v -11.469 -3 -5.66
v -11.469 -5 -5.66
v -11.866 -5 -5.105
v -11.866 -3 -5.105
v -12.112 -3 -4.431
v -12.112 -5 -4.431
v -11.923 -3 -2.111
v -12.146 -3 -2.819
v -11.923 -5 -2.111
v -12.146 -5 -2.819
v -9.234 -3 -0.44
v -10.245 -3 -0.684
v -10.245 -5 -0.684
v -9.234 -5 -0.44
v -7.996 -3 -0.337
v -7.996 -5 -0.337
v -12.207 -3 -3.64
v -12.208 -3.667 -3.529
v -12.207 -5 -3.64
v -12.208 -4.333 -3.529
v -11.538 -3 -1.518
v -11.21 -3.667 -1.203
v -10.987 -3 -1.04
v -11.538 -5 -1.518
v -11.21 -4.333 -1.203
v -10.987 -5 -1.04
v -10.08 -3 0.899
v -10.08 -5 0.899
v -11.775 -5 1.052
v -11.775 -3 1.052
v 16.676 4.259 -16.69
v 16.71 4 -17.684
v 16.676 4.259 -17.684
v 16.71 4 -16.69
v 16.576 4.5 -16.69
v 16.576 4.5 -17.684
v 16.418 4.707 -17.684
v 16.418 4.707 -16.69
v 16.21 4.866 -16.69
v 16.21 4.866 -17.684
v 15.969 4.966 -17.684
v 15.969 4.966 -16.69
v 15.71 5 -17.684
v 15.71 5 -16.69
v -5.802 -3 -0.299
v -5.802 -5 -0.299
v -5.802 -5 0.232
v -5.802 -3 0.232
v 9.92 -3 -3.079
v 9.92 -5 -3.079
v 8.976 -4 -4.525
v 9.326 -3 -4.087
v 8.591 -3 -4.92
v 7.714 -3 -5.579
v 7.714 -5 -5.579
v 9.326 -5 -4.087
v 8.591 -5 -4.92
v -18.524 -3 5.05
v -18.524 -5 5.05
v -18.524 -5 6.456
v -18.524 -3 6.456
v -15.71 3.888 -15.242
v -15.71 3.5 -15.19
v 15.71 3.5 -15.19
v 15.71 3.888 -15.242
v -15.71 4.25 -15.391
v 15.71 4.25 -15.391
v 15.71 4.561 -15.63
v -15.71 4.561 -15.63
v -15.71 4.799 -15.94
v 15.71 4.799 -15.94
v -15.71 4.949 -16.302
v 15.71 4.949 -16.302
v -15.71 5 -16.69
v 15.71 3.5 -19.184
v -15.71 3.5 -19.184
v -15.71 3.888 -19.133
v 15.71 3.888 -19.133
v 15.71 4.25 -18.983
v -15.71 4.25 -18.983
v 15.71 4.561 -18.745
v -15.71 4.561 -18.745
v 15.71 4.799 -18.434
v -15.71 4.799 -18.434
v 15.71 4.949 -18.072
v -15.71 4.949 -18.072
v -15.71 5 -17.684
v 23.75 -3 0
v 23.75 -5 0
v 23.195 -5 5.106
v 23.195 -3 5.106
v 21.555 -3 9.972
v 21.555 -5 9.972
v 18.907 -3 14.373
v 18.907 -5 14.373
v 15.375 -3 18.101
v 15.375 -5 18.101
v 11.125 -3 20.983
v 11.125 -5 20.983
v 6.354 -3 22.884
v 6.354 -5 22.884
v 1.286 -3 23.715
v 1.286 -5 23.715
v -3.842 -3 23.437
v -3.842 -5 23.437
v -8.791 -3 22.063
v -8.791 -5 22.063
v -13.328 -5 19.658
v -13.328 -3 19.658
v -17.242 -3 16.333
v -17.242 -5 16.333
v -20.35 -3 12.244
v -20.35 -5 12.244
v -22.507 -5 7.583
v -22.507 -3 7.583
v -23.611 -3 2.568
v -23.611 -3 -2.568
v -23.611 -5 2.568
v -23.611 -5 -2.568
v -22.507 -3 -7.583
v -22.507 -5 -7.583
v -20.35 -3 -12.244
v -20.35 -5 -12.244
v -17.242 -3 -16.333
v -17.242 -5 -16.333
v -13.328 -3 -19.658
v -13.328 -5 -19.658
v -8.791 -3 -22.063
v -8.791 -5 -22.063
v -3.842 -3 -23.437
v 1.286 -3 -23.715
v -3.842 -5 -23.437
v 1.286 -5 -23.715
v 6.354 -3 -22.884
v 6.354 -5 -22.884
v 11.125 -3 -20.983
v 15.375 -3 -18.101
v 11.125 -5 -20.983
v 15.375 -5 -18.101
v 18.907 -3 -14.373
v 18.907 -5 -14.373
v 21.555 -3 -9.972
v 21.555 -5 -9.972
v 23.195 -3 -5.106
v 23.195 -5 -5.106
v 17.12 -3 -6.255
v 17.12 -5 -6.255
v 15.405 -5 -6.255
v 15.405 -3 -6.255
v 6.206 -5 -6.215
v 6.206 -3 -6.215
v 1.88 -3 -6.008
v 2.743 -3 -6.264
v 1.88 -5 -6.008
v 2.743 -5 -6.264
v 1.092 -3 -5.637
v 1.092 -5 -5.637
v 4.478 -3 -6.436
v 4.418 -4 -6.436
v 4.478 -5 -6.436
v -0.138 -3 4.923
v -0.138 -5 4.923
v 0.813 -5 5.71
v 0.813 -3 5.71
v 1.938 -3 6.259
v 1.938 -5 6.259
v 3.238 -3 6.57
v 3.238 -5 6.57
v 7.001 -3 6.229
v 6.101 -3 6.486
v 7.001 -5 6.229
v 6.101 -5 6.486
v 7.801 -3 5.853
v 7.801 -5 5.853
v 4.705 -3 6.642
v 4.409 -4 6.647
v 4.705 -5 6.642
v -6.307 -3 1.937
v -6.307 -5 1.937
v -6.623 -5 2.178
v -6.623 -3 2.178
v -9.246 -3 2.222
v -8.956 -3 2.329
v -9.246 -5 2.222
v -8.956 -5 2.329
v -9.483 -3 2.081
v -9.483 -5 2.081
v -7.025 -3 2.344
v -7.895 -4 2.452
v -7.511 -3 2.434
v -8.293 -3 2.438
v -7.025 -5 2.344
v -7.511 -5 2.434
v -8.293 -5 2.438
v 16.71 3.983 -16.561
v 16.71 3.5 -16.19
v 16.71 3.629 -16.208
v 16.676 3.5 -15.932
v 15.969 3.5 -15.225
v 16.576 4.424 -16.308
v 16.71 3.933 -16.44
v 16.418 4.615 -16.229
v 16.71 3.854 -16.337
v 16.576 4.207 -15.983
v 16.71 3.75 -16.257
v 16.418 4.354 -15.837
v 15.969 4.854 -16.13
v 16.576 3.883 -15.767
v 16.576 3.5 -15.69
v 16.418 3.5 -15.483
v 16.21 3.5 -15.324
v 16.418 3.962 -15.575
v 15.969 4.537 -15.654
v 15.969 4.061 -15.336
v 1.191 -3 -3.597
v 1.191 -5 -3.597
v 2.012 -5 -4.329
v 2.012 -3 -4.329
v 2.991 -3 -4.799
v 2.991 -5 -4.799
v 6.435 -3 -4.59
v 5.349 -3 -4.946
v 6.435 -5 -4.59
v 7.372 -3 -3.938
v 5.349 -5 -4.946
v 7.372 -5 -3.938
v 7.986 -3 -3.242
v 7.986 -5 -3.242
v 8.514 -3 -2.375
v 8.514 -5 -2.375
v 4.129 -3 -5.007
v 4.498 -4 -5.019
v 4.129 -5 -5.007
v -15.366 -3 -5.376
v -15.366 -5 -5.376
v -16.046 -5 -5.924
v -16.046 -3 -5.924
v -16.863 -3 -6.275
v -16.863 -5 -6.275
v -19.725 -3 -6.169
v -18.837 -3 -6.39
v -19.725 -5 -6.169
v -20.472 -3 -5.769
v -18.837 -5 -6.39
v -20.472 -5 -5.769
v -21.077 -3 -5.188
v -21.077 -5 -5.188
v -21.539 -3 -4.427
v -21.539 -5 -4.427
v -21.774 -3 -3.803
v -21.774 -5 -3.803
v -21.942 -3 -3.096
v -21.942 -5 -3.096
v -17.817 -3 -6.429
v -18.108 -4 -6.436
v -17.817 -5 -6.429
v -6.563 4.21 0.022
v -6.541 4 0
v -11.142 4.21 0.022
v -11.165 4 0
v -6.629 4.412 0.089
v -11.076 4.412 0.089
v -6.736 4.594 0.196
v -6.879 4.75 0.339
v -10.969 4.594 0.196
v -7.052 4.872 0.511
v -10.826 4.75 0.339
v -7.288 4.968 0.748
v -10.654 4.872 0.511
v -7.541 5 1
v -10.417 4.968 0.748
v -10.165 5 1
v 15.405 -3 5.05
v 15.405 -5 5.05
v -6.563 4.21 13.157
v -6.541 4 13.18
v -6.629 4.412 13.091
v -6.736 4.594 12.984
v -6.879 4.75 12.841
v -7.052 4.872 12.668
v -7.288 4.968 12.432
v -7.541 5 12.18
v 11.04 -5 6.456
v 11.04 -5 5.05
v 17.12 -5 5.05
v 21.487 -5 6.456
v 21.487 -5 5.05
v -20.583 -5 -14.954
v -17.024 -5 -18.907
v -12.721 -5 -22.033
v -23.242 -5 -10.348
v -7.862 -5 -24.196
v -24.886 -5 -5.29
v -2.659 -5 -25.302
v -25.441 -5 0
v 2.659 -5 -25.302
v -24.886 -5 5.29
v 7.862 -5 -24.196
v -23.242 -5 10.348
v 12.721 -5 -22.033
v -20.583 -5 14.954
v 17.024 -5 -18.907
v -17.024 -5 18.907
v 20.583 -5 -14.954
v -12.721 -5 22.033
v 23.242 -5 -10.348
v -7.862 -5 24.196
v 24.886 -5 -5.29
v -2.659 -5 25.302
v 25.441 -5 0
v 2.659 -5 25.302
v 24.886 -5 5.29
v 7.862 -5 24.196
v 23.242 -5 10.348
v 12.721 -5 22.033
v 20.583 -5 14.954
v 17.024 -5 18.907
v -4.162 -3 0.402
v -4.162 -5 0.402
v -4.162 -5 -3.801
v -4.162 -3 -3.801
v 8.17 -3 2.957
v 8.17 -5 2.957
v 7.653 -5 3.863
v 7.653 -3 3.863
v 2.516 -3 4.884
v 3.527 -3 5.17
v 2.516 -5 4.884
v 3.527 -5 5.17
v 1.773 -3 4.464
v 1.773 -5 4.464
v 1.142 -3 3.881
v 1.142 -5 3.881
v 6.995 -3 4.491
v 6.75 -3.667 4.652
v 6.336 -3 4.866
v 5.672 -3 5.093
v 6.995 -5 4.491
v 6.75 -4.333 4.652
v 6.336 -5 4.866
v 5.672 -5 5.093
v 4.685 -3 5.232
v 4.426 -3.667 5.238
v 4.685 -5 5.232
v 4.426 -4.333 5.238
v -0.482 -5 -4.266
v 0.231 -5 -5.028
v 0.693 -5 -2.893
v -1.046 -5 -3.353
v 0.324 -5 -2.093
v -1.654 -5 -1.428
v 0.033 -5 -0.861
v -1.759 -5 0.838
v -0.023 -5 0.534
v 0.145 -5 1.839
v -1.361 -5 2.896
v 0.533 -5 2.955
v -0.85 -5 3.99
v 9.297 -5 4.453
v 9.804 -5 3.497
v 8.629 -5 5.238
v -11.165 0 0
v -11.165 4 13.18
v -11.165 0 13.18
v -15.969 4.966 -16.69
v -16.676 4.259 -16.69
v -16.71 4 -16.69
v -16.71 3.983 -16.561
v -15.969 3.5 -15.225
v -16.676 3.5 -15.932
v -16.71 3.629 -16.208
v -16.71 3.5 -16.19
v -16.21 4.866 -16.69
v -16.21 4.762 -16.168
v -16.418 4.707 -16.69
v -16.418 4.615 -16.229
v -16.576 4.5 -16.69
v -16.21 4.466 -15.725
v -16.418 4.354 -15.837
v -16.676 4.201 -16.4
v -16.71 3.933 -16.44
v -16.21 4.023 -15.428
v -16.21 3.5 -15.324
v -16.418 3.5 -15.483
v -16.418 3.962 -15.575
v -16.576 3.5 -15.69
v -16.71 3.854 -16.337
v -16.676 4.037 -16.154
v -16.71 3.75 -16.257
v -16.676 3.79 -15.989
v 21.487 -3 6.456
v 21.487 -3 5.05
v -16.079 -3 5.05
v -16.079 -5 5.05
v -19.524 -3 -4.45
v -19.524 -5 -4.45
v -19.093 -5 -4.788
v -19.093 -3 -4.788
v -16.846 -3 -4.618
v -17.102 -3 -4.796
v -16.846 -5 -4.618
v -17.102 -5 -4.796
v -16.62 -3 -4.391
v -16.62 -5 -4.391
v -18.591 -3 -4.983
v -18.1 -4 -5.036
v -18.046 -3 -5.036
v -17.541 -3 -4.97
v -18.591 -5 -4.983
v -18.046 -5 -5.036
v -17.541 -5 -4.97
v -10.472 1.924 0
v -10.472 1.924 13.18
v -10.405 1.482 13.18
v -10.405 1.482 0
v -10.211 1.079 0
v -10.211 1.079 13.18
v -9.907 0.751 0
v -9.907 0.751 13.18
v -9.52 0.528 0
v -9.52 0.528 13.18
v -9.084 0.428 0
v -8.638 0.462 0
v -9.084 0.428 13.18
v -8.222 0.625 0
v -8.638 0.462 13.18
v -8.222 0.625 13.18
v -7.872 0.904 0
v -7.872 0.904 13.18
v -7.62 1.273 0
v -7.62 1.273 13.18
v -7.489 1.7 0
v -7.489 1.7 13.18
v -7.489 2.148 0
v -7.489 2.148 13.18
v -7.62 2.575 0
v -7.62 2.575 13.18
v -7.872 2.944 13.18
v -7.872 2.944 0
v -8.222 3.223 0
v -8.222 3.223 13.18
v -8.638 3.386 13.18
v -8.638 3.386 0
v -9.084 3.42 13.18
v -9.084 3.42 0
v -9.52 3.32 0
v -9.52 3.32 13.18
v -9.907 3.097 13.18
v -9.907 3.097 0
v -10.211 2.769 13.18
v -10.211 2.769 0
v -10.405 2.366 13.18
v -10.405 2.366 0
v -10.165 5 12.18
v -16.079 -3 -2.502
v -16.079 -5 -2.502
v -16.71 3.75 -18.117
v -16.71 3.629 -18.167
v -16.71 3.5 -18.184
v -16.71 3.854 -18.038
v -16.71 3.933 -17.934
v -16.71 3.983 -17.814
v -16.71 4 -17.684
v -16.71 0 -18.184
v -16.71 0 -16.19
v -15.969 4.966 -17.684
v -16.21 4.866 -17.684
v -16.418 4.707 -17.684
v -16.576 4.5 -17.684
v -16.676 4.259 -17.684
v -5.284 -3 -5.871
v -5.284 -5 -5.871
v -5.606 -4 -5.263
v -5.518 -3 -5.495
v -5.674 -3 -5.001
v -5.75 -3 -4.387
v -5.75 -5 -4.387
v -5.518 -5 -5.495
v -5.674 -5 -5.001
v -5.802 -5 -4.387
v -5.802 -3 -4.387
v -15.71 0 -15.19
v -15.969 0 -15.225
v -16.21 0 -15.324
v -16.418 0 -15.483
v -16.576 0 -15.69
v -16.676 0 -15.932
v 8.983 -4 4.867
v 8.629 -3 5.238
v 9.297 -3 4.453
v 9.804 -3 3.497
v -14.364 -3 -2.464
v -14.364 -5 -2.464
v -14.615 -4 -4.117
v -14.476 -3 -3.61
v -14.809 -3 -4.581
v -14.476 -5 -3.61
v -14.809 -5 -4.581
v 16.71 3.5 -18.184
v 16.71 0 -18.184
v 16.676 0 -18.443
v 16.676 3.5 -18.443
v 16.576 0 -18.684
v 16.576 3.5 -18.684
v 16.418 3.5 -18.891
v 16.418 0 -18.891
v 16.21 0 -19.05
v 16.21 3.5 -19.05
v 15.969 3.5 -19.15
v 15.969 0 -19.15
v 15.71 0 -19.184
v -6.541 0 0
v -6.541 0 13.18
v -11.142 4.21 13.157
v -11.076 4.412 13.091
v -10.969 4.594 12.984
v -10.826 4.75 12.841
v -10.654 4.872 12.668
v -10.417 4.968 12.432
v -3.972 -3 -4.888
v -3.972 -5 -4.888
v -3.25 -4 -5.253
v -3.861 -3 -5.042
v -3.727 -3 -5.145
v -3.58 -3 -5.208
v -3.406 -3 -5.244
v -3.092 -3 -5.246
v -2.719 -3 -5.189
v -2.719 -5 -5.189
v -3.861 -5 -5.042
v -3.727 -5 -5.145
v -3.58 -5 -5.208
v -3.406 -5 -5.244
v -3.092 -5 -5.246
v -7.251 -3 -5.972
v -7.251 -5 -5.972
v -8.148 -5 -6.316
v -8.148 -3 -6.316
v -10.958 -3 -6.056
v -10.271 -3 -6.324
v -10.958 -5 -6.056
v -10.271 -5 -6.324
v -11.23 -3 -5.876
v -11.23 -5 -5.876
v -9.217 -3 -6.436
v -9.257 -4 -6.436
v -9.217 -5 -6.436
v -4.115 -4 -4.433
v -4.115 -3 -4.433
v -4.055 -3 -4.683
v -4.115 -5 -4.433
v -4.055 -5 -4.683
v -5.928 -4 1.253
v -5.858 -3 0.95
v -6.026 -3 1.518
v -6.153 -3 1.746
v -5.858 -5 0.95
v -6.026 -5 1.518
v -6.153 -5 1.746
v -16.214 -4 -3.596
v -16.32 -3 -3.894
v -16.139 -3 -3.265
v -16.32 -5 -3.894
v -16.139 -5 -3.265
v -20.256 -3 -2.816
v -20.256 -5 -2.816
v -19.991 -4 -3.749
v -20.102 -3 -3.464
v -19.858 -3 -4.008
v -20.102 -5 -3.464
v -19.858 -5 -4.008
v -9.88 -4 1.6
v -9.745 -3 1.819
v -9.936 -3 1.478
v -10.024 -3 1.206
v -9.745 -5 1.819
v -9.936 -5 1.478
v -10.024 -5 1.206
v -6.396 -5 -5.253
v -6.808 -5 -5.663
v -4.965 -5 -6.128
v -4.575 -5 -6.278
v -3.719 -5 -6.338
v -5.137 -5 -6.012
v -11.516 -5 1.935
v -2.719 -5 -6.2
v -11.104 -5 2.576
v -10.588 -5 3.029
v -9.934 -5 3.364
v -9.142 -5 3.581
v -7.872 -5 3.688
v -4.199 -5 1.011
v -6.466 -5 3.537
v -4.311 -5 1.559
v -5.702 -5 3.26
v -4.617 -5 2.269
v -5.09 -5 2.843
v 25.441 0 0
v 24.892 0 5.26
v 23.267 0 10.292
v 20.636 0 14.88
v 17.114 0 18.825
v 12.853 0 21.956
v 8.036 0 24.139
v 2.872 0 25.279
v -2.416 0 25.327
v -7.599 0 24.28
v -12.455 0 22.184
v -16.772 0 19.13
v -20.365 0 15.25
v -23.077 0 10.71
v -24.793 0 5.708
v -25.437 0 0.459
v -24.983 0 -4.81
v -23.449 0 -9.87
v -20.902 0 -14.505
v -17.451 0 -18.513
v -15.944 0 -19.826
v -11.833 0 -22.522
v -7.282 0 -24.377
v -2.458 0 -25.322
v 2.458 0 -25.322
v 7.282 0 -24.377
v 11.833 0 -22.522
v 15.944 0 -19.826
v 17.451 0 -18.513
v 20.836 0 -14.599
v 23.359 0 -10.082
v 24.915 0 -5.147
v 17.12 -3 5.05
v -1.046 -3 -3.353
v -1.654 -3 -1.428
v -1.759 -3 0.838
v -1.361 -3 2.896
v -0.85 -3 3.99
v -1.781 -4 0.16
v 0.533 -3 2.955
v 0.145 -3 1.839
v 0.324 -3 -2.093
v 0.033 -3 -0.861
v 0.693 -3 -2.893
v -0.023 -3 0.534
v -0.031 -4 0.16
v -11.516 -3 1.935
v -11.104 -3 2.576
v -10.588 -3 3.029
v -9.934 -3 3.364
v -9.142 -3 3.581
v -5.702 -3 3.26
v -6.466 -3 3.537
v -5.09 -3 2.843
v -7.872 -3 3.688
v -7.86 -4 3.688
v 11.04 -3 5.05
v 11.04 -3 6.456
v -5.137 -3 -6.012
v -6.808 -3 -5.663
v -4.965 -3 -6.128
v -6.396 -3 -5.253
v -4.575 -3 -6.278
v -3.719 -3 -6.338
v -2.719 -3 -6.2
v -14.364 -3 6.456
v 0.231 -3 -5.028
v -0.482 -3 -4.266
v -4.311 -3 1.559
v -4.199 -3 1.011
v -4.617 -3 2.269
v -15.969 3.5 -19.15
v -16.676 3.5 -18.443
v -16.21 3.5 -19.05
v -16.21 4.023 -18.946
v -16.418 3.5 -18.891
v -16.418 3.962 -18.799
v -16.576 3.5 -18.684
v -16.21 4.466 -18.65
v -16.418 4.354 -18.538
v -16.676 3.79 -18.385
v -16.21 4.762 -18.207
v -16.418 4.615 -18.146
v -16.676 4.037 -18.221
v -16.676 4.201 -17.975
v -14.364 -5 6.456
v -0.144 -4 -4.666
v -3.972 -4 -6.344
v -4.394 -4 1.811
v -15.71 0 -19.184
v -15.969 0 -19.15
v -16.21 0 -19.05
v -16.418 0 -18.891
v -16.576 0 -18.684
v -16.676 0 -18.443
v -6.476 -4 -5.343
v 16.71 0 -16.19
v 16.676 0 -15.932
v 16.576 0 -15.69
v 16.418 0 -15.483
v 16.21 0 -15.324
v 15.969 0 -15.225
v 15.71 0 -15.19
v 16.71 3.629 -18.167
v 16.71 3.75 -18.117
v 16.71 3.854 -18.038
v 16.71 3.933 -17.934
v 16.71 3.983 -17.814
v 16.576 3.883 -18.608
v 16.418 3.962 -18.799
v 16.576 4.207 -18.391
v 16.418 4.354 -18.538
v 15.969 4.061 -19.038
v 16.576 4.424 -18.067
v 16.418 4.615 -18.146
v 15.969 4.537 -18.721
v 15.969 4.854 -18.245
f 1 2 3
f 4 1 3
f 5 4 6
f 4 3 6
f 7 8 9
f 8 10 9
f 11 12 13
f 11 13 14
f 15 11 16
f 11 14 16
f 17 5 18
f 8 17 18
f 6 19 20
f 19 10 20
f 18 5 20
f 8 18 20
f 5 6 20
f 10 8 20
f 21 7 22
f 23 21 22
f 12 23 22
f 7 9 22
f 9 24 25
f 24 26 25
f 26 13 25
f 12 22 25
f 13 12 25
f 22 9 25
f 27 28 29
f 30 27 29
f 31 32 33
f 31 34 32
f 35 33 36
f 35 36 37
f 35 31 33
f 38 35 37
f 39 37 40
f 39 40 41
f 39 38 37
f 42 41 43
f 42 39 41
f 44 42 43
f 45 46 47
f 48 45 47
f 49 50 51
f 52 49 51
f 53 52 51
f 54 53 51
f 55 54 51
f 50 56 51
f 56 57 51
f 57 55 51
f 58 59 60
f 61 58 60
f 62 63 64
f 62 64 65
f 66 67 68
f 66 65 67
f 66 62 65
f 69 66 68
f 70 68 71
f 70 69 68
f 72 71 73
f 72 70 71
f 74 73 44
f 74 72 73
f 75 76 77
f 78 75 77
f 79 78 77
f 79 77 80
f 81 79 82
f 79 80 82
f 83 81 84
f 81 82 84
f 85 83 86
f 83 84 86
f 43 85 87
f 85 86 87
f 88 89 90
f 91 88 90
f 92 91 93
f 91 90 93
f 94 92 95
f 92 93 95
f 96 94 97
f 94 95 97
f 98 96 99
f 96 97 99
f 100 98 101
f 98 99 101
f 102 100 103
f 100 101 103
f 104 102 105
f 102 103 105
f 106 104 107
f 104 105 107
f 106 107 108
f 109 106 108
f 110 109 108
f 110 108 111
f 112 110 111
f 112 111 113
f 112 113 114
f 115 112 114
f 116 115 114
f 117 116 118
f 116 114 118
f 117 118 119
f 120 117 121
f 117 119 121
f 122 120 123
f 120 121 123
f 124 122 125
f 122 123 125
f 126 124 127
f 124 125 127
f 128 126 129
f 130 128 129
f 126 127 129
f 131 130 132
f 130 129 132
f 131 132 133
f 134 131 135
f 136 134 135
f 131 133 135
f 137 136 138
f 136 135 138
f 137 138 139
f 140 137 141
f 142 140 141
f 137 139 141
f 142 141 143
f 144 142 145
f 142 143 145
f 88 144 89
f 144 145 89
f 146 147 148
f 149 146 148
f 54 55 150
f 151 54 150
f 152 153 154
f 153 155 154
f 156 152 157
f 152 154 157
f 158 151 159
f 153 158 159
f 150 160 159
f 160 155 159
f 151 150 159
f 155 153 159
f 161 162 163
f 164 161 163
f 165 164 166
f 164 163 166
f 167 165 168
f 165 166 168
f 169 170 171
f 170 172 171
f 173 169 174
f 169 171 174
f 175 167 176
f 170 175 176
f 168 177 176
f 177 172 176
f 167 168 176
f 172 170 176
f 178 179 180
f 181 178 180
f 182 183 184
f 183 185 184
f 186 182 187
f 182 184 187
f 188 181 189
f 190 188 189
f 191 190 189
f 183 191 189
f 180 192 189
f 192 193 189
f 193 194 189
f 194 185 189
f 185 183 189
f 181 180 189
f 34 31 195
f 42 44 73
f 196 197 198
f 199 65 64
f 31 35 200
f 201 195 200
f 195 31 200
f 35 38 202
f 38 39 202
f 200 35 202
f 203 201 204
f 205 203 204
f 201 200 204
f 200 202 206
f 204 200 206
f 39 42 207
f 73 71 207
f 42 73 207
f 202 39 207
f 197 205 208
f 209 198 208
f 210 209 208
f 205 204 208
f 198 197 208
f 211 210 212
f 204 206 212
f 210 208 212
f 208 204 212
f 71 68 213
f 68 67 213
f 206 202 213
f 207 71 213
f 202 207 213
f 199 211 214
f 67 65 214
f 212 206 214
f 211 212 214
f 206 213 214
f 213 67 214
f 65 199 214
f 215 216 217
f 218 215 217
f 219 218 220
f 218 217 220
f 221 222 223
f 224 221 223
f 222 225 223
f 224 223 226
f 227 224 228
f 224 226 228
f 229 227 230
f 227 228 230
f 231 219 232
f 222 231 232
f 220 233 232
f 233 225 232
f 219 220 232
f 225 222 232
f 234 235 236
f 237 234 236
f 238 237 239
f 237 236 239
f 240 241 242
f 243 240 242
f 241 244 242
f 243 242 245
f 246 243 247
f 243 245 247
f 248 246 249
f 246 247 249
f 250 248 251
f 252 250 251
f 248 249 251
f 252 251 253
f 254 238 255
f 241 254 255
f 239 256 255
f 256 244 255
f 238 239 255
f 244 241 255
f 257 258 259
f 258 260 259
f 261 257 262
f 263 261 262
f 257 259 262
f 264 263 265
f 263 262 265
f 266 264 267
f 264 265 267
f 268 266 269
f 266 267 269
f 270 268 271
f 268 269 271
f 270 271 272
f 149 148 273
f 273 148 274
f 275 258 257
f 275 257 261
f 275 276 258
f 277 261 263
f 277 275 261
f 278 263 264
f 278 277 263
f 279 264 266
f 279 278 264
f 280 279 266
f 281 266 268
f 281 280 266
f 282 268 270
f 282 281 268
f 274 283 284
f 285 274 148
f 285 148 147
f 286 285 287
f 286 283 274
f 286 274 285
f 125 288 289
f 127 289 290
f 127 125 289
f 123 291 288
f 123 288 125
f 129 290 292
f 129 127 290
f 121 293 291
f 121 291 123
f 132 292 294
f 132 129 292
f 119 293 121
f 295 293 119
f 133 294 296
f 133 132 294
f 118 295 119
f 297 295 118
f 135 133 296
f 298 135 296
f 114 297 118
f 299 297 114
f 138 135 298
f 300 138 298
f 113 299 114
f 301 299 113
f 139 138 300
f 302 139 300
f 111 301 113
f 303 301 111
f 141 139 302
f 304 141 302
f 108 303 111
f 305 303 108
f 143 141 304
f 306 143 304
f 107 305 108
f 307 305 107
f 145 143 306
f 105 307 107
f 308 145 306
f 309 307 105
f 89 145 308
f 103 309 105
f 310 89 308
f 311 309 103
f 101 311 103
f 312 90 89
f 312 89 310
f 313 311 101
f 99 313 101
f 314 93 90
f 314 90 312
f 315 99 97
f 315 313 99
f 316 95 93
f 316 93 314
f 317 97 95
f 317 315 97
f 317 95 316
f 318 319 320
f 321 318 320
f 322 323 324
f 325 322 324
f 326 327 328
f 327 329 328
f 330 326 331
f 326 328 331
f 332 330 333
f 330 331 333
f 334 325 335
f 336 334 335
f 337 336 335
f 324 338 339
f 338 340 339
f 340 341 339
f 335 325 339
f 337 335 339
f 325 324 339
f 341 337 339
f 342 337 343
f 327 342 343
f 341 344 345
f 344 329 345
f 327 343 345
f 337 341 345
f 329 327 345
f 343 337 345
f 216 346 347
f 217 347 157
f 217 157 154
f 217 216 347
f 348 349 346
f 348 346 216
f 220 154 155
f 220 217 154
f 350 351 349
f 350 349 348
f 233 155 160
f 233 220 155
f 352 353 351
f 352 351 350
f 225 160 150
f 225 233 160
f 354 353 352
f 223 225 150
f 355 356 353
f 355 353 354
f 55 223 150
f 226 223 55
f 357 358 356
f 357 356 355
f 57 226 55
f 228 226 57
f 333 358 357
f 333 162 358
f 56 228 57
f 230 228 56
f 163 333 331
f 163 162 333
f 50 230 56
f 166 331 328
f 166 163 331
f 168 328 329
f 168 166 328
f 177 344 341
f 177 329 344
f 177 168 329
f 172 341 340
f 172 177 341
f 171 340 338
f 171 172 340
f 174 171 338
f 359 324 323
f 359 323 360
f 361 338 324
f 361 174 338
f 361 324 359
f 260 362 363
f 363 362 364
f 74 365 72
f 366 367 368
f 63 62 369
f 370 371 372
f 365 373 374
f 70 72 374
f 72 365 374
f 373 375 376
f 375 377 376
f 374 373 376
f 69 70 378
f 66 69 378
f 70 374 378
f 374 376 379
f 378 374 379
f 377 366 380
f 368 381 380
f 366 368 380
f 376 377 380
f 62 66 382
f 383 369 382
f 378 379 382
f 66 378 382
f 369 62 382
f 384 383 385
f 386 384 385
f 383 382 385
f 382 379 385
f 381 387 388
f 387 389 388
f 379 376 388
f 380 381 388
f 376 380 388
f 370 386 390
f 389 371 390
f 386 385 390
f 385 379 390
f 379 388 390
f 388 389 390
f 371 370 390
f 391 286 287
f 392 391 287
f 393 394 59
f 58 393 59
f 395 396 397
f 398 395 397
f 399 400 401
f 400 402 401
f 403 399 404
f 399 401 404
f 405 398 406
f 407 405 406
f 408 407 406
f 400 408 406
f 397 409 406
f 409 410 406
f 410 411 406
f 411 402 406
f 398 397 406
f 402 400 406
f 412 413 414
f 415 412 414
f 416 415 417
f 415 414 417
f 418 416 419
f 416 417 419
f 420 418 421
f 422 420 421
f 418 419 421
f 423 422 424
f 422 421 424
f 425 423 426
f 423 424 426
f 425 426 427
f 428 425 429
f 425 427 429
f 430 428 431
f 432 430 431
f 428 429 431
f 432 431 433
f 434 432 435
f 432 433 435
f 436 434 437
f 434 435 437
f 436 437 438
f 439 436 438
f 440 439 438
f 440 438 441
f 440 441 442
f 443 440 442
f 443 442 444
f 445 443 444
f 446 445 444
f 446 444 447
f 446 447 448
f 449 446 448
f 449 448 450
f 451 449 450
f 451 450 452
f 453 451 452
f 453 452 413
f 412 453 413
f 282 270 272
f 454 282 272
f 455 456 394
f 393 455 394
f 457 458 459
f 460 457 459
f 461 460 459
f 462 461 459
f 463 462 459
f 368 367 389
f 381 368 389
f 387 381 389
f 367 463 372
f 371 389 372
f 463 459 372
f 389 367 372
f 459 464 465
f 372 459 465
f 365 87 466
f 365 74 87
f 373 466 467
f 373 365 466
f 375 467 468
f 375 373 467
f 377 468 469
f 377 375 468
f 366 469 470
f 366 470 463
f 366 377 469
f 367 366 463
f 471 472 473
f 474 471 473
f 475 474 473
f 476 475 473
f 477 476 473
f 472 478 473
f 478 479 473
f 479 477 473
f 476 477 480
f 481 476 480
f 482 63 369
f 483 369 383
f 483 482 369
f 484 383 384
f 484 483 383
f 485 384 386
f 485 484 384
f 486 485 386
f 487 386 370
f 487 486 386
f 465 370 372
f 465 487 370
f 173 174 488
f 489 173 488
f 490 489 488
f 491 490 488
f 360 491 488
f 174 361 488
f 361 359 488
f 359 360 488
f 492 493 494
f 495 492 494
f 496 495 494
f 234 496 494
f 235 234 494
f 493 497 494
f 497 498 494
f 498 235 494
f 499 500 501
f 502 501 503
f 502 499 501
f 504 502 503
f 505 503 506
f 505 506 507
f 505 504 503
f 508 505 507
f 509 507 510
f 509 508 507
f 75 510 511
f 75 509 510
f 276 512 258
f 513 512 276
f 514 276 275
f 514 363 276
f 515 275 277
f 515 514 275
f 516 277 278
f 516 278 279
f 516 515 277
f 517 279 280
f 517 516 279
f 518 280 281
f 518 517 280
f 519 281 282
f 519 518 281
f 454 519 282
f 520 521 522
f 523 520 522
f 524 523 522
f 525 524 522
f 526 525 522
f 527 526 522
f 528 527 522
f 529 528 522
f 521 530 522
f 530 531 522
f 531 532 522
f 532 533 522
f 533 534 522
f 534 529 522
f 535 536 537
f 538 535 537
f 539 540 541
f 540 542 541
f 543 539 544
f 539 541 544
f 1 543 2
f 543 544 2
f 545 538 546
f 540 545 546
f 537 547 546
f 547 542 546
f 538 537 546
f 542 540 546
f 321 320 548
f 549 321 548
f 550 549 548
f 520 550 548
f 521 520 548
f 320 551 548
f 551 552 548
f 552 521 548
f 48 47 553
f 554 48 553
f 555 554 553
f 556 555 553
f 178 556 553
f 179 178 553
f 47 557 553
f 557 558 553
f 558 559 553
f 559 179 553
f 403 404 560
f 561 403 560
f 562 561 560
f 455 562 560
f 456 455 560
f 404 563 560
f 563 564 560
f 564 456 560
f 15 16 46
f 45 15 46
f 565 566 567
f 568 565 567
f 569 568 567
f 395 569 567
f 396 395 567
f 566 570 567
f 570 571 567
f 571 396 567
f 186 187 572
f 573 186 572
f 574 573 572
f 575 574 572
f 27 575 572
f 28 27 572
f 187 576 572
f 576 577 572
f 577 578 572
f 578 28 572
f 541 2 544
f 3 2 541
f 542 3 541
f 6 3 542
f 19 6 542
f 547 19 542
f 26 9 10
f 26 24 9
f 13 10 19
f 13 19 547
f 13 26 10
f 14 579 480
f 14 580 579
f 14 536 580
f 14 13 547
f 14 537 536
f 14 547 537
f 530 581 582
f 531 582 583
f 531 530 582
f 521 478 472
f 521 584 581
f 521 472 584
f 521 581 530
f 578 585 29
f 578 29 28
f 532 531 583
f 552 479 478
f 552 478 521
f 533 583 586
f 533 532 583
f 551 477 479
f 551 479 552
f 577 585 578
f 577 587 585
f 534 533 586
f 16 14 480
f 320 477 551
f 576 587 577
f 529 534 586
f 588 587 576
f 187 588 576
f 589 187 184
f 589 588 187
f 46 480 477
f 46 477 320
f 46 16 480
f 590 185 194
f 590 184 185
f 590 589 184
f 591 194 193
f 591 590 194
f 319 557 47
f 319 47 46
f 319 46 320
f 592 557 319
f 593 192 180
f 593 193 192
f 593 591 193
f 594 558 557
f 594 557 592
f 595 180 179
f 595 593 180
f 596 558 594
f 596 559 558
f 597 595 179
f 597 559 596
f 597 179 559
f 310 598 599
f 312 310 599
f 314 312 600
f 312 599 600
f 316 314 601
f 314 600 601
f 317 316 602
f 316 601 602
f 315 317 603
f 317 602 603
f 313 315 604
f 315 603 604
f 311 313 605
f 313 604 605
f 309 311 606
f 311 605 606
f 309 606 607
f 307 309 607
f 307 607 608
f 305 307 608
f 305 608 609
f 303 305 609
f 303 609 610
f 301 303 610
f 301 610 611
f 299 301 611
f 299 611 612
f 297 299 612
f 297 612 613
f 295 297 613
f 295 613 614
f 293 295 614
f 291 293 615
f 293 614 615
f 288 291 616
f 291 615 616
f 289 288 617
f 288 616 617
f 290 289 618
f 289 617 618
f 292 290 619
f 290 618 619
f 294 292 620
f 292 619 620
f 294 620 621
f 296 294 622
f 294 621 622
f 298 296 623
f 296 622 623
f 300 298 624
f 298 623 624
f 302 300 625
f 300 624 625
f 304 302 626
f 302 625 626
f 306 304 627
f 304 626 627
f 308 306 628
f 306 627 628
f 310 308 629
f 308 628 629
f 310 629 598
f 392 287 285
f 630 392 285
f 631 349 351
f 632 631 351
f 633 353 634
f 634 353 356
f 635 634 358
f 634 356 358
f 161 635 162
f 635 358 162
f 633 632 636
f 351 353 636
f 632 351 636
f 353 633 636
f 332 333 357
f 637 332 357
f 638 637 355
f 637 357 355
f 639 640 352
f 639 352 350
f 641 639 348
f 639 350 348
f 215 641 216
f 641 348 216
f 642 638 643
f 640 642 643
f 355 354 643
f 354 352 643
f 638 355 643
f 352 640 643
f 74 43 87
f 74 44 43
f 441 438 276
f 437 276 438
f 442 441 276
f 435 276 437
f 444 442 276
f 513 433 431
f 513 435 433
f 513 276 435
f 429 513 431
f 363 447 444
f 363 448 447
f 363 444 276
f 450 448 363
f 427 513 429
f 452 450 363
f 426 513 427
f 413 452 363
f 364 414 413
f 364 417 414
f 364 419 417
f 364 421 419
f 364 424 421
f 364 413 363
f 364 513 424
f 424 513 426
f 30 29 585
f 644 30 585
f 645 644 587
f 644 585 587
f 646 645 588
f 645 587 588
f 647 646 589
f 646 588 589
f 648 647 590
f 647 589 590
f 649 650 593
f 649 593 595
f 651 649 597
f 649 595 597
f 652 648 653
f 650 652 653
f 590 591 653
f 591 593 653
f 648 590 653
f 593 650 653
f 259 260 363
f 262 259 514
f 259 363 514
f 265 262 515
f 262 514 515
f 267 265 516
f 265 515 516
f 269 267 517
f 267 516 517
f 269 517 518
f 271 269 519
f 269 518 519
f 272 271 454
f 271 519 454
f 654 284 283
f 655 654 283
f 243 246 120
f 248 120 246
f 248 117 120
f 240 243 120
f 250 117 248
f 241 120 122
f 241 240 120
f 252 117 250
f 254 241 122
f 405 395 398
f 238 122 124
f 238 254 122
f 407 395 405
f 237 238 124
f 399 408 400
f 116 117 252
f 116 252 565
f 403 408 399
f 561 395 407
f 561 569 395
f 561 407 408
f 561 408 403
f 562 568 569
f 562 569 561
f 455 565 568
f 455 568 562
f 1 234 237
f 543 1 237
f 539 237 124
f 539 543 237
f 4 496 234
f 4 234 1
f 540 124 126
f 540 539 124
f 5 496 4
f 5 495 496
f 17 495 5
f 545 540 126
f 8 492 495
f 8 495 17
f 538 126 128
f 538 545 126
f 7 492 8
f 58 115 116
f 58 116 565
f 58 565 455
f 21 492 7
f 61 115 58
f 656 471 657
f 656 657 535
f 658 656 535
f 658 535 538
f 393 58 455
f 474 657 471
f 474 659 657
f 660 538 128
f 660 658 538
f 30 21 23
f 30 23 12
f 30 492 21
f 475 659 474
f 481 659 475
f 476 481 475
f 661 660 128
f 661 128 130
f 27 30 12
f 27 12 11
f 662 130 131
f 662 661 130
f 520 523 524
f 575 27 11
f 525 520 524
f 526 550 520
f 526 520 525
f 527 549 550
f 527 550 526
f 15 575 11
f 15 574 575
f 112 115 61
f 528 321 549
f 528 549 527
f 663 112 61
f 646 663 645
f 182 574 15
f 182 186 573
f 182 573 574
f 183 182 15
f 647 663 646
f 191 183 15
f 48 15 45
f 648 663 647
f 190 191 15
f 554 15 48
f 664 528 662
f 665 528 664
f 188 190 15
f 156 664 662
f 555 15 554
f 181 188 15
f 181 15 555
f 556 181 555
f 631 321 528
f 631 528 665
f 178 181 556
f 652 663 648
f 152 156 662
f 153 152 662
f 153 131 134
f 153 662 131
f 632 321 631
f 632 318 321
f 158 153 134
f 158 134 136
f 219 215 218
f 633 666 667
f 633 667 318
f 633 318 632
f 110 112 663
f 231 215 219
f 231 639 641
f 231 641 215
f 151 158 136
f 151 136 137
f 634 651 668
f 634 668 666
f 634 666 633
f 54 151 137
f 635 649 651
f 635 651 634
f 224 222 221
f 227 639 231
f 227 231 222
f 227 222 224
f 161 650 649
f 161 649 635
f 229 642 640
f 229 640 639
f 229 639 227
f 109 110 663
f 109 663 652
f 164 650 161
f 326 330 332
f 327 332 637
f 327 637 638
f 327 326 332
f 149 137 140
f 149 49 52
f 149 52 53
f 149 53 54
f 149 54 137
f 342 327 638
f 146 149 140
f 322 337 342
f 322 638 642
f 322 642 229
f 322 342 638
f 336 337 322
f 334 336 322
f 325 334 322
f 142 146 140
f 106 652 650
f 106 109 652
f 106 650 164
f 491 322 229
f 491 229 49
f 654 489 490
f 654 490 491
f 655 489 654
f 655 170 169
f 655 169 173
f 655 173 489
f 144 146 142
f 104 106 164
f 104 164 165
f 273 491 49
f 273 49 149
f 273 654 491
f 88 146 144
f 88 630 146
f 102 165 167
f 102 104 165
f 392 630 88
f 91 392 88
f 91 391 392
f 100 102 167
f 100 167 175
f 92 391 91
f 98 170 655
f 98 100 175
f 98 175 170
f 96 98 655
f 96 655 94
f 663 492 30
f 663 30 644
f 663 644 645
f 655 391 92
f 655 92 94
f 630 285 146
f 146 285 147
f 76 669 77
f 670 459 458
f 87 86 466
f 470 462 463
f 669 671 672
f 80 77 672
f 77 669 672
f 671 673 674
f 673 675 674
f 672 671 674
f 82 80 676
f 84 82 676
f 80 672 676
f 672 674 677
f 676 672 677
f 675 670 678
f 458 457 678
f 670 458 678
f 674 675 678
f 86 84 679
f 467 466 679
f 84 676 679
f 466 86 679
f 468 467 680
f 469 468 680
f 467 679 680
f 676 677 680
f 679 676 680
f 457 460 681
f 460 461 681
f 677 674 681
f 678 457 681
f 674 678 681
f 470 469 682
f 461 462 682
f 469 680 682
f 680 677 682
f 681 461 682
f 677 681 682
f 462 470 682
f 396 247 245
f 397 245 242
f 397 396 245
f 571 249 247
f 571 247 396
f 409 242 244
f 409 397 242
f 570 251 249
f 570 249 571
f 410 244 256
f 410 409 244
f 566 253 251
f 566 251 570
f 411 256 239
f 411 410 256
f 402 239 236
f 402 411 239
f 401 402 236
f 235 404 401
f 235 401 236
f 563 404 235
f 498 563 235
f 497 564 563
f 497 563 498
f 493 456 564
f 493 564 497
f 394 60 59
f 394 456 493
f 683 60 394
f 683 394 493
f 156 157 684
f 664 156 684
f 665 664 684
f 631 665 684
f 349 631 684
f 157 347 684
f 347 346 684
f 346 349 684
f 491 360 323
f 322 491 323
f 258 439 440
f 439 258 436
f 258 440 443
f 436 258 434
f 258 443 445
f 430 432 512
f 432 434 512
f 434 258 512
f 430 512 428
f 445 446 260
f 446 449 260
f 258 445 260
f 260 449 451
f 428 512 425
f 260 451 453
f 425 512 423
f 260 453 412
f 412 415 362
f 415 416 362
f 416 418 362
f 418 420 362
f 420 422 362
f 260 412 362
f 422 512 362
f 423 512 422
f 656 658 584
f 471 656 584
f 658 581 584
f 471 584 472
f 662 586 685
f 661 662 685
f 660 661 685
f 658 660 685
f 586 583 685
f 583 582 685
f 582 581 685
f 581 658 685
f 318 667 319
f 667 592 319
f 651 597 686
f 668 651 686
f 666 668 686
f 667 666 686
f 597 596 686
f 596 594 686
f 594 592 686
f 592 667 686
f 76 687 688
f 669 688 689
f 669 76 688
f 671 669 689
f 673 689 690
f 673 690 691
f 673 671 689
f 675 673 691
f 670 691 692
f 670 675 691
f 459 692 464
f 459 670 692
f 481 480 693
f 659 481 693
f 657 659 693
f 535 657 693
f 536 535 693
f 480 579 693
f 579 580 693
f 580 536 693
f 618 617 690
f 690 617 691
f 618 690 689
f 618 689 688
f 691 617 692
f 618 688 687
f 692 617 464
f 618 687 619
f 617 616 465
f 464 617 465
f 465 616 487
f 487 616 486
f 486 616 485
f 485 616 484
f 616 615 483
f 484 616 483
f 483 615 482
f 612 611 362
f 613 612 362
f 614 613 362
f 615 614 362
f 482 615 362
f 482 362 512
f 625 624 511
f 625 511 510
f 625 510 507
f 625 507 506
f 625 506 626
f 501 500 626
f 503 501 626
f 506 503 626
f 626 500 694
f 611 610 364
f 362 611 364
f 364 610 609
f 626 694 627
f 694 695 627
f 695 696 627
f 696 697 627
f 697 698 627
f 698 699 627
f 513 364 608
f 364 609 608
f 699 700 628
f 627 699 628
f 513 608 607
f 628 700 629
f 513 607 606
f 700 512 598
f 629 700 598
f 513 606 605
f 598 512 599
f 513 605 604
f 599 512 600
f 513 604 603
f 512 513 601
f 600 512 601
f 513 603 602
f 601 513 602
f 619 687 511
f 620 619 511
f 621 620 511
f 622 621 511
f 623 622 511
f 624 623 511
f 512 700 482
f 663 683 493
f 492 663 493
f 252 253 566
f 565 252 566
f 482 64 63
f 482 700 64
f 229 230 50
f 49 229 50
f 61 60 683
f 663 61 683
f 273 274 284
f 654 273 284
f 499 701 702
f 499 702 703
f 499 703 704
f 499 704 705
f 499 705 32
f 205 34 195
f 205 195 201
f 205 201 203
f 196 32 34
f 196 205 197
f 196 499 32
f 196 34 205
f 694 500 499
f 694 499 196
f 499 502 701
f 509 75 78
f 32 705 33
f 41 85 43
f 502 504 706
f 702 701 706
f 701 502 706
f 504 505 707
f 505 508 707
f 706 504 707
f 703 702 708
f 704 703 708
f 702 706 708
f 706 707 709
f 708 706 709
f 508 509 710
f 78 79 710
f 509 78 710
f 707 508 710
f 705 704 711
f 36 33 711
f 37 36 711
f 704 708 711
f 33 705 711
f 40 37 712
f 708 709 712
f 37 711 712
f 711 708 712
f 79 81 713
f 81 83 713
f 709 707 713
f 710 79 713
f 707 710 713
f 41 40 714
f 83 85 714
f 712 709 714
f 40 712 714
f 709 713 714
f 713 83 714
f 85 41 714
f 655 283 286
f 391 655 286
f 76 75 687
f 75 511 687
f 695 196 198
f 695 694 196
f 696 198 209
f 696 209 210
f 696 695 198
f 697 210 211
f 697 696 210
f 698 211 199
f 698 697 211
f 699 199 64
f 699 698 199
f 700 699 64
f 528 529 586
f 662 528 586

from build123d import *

# Parameters (mm, degrees)
F0_R      = 25.4414928825
F1_DEPTH  = 5
F2_R      = 23.75
F3_DEPTH  = 2
F4_W      = 4.6242554672
F4_H      = 13.1795220077
F5_DEPTH  = 5
F6_R      = 1
F8_D      = 3
F9_W      = 33.4208746554
F9_H      = 3.9936437383
F10_DEPTH = 5
F11_R     = 1.5
F12_R     = 1


with BuildPart() as f1:
    # F0 (on Front) → F1 (new body)
    with BuildSketch(Plane.XZ):
        Circle(F0_R)
    extrude(amount=F1_DEPTH)

    # F2 (on face) → F3 (cut)
    with BuildSketch(Plane.XZ.offset(5)):
        Circle(F2_R)
        with BuildLine():
            add(Edge.make_bspline(
                [(-7.2510674036, -5.9716344181), (-8.0767025075, -6.4364150185), (-9.2574184429, -6.4364150185)],
                knots=[0, 0, 0, 1, 1, 1], degree=2))
            add(Edge.make_bspline(
                [(-9.2574184429, -6.4364150185), (-10.729704817, -6.4364150185), (-11.4687348401, -5.6598561271)],
                knots=[0, 0, 0, 1, 1, 1], degree=2))
            add(Edge.make_bspline(
                [(-11.4687348401, -5.6598561271), (-12.2077648632, -4.8832972356), (-12.2077648632, -3.5293711386)],
                knots=[0, 0, 0, 1, 1, 1], degree=2))
            add(Edge.make_bspline(
                [(-12.2077648632, -3.5293711386), (-12.2077648632, -2.0137822241), (-11.2103630156, -1.2025813003)],
                knots=[0, 0, 0, 1, 1, 1], degree=2))
            add(Edge.make_bspline(
                [(-11.2103630156, -1.2025813003), (-10.212961168, -0.3913803765), (-7.9958710988, -0.336530492)],
                knots=[0, 0, 0, 1, 1, 1], degree=2))
            Line((-7.9958710988, -0.336530492), (-5.8018757177, -0.2990016236))
            Line((-5.8018757177, -0.2990016236), (-5.8018757177, 0.2321762055))
            add(Edge.make_bspline(
                [(-5.8018757177, 0.2321762055), (-5.8018757177, 1.4215526489), (-6.3070720225, 1.9368528798)],
                knots=[0, 0, 0, 1, 1, 1], degree=2))
            add(Edge.make_bspline(
                [(-6.3070720225, 1.9368528798), (-6.8122683274, 2.4521531108), (-7.8948318378, 2.4521531108)],
                knots=[0, 0, 0, 1, 1, 1], degree=2))
            add(Edge.make_bspline(
                [(-7.8948318378, 2.4521531108), (-8.9860558563, 2.4521531108), (-9.482591653, 2.0811946812)],
                knots=[0, 0, 0, 1, 1, 1], degree=2))
            add(Edge.make_bspline(
                [(-9.482591653, 2.0811946812), (-9.9791274498, 1.7102362517), (-10.0801667108, 0.8990353279)],
                knots=[0, 0, 0, 1, 1, 1], degree=2))
            Line((-10.0801667108, 0.8990353279), (-11.774739459, 1.0520376373))
            add(Edge.make_bspline(
                [(-11.774739459, 1.0520376373), (-11.359035071, 3.6877189307), (-7.8601898055, 3.6877189307)],
                knots=[0, 0, 0, 1, 1, 1], degree=2))
            add(Edge.make_bspline(
                [(-7.8601898055, 3.6877189307), (-6.0183884198, 3.6877189307), (-5.0902706369, 2.8433193925)],
                knots=[0, 0, 0, 1, 1, 1], degree=2))
            add(Edge.make_bspline(
                [(-5.0902706369, 2.8433193925), (-4.162152854, 1.9989198544), (-4.162152854, 0.4024995311)],
                knots=[0, 0, 0, 1, 1, 1], degree=2))
            Line((-4.162152854, 0.4024995311), (-4.162152854, -3.8007337252))
            add(Edge.make_bspline(
                [(-4.162152854, -3.8007337252), (-4.162152854, -4.5224427322), (-3.9716216761, -4.8876274897)],
                knots=[0, 0, 0, 1, 1, 1], degree=2))
            add(Edge.make_bspline(
                [(-3.9716216761, -4.8876274897), (-3.7810904983, -5.2528122472), (-3.2499126692, -5.2528122472)],
                knots=[0, 0, 0, 1, 1, 1], degree=2))
            add(Edge.make_bspline(
                [(-3.2499126692, -5.2528122472), (-3.016078951, -5.2528122472), (-2.7187348401, -5.1893018546)],
                knots=[0, 0, 0, 1, 1, 1], degree=2))
            Line((-2.7187348401, -5.1893018546), (-2.7187348401, -6.1996944643))
            add(Edge.make_bspline(
                [(-2.7187348401, -6.1996944643), (-3.330744078, -6.3440362657), (-3.9716216761, -6.3440362657)],
                knots=[0, 0, 0, 1, 1, 1], degree=2))
            add(Edge.make_bspline(
                [(-3.9716216761, -6.3440362657), (-4.8723145168, -6.3440362657), (-5.2836886507, -5.8705951571)],
                knots=[0, 0, 0, 1, 1, 1], degree=2))
            add(Edge.make_bspline(
                [(-5.2836886507, -5.8705951571), (-5.6950627847, -5.3971540486), (-5.7499126692, -4.3867614389)],
                knots=[0, 0, 0, 1, 1, 1], degree=2))
            Line((-5.7499126692, -4.3867614389), (-5.8018757177, -4.3867614389))
            add(Edge.make_bspline(
                [(-5.8018757177, -4.3867614389), (-6.4254322997, -5.5068538176), (-7.2510674036, -5.9716344181)],
                knots=[0, 0, 0, 1, 1, 1], degree=2))
        make_face(mode=Mode.SUBTRACT)
        with BuildLine():
            add(Edge.make_bspline(
                [(-15.3659634775, -5.3755027784), (-16.3676955791, -6.4364150185), (-18.1084577038, -6.4364150185)],
                knots=[0, 0, 0, 1, 1, 1], degree=2))
            add(Edge.make_bspline(
                [(-18.1084577038, -6.4364150185), (-21.3388272188, -6.4364150185), (-21.9421759486, -3.0963457345)],
                knots=[0, 0, 0, 1, 1, 1], degree=2))
            Line((-21.9421759486, -3.0963457345), (-20.2562637085, -2.8163226398))
            add(Edge.make_bspline(
                [(-20.2562637085, -2.8163226398), (-20.0917140549, -3.8642441178), (-19.5244507754, -4.4502718315)],
                knots=[0, 0, 0, 1, 1, 1], degree=2))
            add(Edge.make_bspline(
                [(-19.5244507754, -4.4502718315), (-18.957187496, -5.0362995451), (-18.0997971958, -5.0362995451)],
                knots=[0, 0, 0, 1, 1, 1], degree=2))
            add(Edge.make_bspline(
                [(-18.0997971958, -5.0362995451), (-17.1615754867, -5.0362995451), (-16.6202937316, -4.3910916929)],
                knots=[0, 0, 0, 1, 1, 1], degree=2))
            add(Edge.make_bspline(
                [(-16.6202937316, -4.3910916929), (-16.0790119764, -3.7458838407), (-16.0790119764, -2.5016575128)],
                knots=[0, 0, 0, 1, 1, 1], degree=2))
            Line((-16.0790119764, -2.5016575128), (-16.0790119764, 5.0503055357))
            Line((-16.0790119764, 5.0503055357), (-18.5241620918, 5.0503055357))
            Line((-18.5241620918, 5.0503055357), (-18.5241620918, 6.4561946812))
            Line((-18.5241620918, 6.4561946812), (-14.3642313759, 6.4561946812))
            Line((-14.3642313759, 6.4561946812), (-14.3642313759, -2.4641286444))
            add(Edge.make_bspline(
                [(-14.3642313759, -2.4641286444), (-14.3642313759, -4.3145905382), (-15.3659634775, -5.3755027784)],
                knots=[0, 0, 0, 1, 1, 1], degree=2))
        make_face(mode=Mode.SUBTRACT)
        with BuildLine():
            add(Edge.make_bspline(
                [(6.7500873308, 4.6519221639), (5.7714499174, 5.2379498775), (4.4261843285, 5.2379498775)],
                knots=[0, 0, 0, 1, 1, 1], degree=2))
            add(Edge.make_bspline(
                [(4.4261843285, 5.2379498775), (2.3159071922, 5.2379498775), (1.142408347, 3.8811369445)],
                knots=[0, 0, 0, 1, 1, 1], degree=2))
            add(Edge.make_bspline(
                [(1.142408347, 3.8811369445), (-0.0310904983, 2.5243240115), (-0.0310904983, 0.1600053048)],
                knots=[0, 0, 0, 1, 1, 1], degree=2))
            add(Edge.make_bspline(
                [(-0.0310904983, 0.1600053048), (-0.0310904983, -2.1754450416), (1.1914845594, -3.5972117853)],
                knots=[0, 0, 0, 1, 1, 1], degree=2))
            add(Edge.make_bspline(
                [(1.1914845594, -3.5972117853), (2.4140596172, -5.0189785289), (4.4983552292, -5.0189785289)],
                knots=[0, 0, 0, 1, 1, 1], degree=2))
            add(Edge.make_bspline(
                [(4.4983552292, -5.0189785289), (7.1686785548, -5.0189785289), (8.5139441437, -2.3746367275)],
                knots=[0, 0, 0, 1, 1, 1], degree=2))
            Line((8.5139441437, -2.3746367275), (9.9198332892, -3.0790247183))
            add(Edge.make_bspline(
                [(9.9198332892, -3.0790247183), (9.1346138897, -4.7216344181), (7.7142905641, -5.5790247183)],
                knots=[0, 0, 0, 1, 1, 1], degree=2))
            add(Edge.make_bspline(
                [(7.7142905641, -5.5790247183), (6.2939672384, -6.4364150185), (4.4175238204, -6.4364150185)],
                knots=[0, 0, 0, 1, 1, 1], degree=2))
            add(Edge.make_bspline(
                [(4.4175238204, -6.4364150185), (2.494891026, -6.4364150185), (1.0918887165, -5.6367614389)],
                knots=[0, 0, 0, 1, 1, 1], degree=2))
            add(Edge.make_bspline(
                [(1.0918887165, -5.6367614389), (-0.311113593, -4.8371078592), (-1.045813362, -3.3532741409)],
                knots=[0, 0, 0, 1, 1, 1], degree=2))
            add(Edge.make_bspline(
                [(-1.045813362, -3.3532741409), (-1.7805131311, -1.8694404227), (-1.7805131311, 0.1600053048)],
                knots=[0, 0, 0, 1, 1, 1], degree=2))
            add(Edge.make_bspline(
                [(-1.7805131311, 0.1600053048), (-1.7805131311, 3.199843642), (-0.1379034313, 4.9232847505)],
                knots=[0, 0, 0, 1, 1, 1], degree=2))
            add(Edge.make_bspline(
                [(-0.1379034313, 4.9232847505), (1.5047062684, 6.6467258591), (4.4088633123, 6.6467258591)],
                knots=[0, 0, 0, 1, 1, 1], degree=2))
            add(Edge.make_bspline(
                [(4.4088633123, 6.6467258591), (6.4383090398, 6.6467258591), (7.8008956449, 5.8528459514)],
                knots=[0, 0, 0, 1, 1, 1], degree=2))
            add(Edge.make_bspline(
                [(7.8008956449, 5.8528459514), (9.16348225, 5.0589660438), (9.8043598481, 3.4971877528)],
                knots=[0, 0, 0, 1, 1, 1], degree=2))
            Line((9.8043598481, 3.4971877528), (8.1704106564, 2.9573494156))
            add(Edge.make_bspline(
                [(8.1704106564, 2.9573494156), (7.7287247442, 4.0658944503), (6.7500873308, 4.6519221639)],
                knots=[0, 0, 0, 1, 1, 1], degree=2))
        make_face(mode=Mode.SUBTRACT)
        Polygon((21.4873852523, 5.0503055357), (17.1196023424, 5.0503055357), (17.1196023424, -6.2545443488), (15.4048217419, -6.2545443488), (15.4048217419, 5.0503055357), (11.039925668, 5.0503055357), (11.039925668, 6.4561946812), (21.4873852523, 6.4561946812), align=None, mode=Mode.SUBTRACT)
    extrude(amount=-F3_DEPTH, mode=Mode.SUBTRACT)

    # F4 (on face) → F5 (join)
    with BuildSketch(Plane(origin=(0, 0, 0), x_dir=(-1, 0, 0), z_dir=(0, 1, 0))):
        with Locations((8.8527675252, 6.5897610039)):
            Rectangle(F4_W, F4_H)
    extrude(amount=F5_DEPTH)

    # F6
    f6_edges = [f1.edges().sort_by_distance(p)[0] for p in [
        (-8.852768, 5, 13.179522),
        (-6.54064, 5, 6.589761),
        (-8.852768, 5, 0),
        (-11.164895, 5, 6.589761),
    ]]
    fillet(f6_edges, radius=F6_R)

    # F8 (through all)
    with Locations(Plane(origin=(0, 0, 0), x_dir=(1, 0, 0), z_dir=(0, 0, -1))):
        with Locations((-8.9718680829, -1.9239948597)):
            Hole(F8_D / 2)

    # F9 (on face) → F10 (join)
    with BuildSketch(Plane(origin=(0, 0, 0), x_dir=(-1, 0, 0), z_dir=(0, 1, 0))):
        with Locations((0, -17.1873081453)):
            Rectangle(F9_W, F9_H)
    extrude(amount=F10_DEPTH)

    # F11
    f11_edges = [f1.edges().sort_by_distance(p)[0] for p in [
        (0, 5, -15.190486),
        (0, 5, -19.18413),
    ]]
    fillet(f11_edges, radius=F11_R)

    # F12
    f12_edges = [f1.edges().sort_by_distance(p)[0] for p in [
        (16.710437, 5, -17.187308),
        (-16.710437, 5, -17.187308),
    ]]
    fillet(f12_edges, radius=F12_R)


solid = f1.part
